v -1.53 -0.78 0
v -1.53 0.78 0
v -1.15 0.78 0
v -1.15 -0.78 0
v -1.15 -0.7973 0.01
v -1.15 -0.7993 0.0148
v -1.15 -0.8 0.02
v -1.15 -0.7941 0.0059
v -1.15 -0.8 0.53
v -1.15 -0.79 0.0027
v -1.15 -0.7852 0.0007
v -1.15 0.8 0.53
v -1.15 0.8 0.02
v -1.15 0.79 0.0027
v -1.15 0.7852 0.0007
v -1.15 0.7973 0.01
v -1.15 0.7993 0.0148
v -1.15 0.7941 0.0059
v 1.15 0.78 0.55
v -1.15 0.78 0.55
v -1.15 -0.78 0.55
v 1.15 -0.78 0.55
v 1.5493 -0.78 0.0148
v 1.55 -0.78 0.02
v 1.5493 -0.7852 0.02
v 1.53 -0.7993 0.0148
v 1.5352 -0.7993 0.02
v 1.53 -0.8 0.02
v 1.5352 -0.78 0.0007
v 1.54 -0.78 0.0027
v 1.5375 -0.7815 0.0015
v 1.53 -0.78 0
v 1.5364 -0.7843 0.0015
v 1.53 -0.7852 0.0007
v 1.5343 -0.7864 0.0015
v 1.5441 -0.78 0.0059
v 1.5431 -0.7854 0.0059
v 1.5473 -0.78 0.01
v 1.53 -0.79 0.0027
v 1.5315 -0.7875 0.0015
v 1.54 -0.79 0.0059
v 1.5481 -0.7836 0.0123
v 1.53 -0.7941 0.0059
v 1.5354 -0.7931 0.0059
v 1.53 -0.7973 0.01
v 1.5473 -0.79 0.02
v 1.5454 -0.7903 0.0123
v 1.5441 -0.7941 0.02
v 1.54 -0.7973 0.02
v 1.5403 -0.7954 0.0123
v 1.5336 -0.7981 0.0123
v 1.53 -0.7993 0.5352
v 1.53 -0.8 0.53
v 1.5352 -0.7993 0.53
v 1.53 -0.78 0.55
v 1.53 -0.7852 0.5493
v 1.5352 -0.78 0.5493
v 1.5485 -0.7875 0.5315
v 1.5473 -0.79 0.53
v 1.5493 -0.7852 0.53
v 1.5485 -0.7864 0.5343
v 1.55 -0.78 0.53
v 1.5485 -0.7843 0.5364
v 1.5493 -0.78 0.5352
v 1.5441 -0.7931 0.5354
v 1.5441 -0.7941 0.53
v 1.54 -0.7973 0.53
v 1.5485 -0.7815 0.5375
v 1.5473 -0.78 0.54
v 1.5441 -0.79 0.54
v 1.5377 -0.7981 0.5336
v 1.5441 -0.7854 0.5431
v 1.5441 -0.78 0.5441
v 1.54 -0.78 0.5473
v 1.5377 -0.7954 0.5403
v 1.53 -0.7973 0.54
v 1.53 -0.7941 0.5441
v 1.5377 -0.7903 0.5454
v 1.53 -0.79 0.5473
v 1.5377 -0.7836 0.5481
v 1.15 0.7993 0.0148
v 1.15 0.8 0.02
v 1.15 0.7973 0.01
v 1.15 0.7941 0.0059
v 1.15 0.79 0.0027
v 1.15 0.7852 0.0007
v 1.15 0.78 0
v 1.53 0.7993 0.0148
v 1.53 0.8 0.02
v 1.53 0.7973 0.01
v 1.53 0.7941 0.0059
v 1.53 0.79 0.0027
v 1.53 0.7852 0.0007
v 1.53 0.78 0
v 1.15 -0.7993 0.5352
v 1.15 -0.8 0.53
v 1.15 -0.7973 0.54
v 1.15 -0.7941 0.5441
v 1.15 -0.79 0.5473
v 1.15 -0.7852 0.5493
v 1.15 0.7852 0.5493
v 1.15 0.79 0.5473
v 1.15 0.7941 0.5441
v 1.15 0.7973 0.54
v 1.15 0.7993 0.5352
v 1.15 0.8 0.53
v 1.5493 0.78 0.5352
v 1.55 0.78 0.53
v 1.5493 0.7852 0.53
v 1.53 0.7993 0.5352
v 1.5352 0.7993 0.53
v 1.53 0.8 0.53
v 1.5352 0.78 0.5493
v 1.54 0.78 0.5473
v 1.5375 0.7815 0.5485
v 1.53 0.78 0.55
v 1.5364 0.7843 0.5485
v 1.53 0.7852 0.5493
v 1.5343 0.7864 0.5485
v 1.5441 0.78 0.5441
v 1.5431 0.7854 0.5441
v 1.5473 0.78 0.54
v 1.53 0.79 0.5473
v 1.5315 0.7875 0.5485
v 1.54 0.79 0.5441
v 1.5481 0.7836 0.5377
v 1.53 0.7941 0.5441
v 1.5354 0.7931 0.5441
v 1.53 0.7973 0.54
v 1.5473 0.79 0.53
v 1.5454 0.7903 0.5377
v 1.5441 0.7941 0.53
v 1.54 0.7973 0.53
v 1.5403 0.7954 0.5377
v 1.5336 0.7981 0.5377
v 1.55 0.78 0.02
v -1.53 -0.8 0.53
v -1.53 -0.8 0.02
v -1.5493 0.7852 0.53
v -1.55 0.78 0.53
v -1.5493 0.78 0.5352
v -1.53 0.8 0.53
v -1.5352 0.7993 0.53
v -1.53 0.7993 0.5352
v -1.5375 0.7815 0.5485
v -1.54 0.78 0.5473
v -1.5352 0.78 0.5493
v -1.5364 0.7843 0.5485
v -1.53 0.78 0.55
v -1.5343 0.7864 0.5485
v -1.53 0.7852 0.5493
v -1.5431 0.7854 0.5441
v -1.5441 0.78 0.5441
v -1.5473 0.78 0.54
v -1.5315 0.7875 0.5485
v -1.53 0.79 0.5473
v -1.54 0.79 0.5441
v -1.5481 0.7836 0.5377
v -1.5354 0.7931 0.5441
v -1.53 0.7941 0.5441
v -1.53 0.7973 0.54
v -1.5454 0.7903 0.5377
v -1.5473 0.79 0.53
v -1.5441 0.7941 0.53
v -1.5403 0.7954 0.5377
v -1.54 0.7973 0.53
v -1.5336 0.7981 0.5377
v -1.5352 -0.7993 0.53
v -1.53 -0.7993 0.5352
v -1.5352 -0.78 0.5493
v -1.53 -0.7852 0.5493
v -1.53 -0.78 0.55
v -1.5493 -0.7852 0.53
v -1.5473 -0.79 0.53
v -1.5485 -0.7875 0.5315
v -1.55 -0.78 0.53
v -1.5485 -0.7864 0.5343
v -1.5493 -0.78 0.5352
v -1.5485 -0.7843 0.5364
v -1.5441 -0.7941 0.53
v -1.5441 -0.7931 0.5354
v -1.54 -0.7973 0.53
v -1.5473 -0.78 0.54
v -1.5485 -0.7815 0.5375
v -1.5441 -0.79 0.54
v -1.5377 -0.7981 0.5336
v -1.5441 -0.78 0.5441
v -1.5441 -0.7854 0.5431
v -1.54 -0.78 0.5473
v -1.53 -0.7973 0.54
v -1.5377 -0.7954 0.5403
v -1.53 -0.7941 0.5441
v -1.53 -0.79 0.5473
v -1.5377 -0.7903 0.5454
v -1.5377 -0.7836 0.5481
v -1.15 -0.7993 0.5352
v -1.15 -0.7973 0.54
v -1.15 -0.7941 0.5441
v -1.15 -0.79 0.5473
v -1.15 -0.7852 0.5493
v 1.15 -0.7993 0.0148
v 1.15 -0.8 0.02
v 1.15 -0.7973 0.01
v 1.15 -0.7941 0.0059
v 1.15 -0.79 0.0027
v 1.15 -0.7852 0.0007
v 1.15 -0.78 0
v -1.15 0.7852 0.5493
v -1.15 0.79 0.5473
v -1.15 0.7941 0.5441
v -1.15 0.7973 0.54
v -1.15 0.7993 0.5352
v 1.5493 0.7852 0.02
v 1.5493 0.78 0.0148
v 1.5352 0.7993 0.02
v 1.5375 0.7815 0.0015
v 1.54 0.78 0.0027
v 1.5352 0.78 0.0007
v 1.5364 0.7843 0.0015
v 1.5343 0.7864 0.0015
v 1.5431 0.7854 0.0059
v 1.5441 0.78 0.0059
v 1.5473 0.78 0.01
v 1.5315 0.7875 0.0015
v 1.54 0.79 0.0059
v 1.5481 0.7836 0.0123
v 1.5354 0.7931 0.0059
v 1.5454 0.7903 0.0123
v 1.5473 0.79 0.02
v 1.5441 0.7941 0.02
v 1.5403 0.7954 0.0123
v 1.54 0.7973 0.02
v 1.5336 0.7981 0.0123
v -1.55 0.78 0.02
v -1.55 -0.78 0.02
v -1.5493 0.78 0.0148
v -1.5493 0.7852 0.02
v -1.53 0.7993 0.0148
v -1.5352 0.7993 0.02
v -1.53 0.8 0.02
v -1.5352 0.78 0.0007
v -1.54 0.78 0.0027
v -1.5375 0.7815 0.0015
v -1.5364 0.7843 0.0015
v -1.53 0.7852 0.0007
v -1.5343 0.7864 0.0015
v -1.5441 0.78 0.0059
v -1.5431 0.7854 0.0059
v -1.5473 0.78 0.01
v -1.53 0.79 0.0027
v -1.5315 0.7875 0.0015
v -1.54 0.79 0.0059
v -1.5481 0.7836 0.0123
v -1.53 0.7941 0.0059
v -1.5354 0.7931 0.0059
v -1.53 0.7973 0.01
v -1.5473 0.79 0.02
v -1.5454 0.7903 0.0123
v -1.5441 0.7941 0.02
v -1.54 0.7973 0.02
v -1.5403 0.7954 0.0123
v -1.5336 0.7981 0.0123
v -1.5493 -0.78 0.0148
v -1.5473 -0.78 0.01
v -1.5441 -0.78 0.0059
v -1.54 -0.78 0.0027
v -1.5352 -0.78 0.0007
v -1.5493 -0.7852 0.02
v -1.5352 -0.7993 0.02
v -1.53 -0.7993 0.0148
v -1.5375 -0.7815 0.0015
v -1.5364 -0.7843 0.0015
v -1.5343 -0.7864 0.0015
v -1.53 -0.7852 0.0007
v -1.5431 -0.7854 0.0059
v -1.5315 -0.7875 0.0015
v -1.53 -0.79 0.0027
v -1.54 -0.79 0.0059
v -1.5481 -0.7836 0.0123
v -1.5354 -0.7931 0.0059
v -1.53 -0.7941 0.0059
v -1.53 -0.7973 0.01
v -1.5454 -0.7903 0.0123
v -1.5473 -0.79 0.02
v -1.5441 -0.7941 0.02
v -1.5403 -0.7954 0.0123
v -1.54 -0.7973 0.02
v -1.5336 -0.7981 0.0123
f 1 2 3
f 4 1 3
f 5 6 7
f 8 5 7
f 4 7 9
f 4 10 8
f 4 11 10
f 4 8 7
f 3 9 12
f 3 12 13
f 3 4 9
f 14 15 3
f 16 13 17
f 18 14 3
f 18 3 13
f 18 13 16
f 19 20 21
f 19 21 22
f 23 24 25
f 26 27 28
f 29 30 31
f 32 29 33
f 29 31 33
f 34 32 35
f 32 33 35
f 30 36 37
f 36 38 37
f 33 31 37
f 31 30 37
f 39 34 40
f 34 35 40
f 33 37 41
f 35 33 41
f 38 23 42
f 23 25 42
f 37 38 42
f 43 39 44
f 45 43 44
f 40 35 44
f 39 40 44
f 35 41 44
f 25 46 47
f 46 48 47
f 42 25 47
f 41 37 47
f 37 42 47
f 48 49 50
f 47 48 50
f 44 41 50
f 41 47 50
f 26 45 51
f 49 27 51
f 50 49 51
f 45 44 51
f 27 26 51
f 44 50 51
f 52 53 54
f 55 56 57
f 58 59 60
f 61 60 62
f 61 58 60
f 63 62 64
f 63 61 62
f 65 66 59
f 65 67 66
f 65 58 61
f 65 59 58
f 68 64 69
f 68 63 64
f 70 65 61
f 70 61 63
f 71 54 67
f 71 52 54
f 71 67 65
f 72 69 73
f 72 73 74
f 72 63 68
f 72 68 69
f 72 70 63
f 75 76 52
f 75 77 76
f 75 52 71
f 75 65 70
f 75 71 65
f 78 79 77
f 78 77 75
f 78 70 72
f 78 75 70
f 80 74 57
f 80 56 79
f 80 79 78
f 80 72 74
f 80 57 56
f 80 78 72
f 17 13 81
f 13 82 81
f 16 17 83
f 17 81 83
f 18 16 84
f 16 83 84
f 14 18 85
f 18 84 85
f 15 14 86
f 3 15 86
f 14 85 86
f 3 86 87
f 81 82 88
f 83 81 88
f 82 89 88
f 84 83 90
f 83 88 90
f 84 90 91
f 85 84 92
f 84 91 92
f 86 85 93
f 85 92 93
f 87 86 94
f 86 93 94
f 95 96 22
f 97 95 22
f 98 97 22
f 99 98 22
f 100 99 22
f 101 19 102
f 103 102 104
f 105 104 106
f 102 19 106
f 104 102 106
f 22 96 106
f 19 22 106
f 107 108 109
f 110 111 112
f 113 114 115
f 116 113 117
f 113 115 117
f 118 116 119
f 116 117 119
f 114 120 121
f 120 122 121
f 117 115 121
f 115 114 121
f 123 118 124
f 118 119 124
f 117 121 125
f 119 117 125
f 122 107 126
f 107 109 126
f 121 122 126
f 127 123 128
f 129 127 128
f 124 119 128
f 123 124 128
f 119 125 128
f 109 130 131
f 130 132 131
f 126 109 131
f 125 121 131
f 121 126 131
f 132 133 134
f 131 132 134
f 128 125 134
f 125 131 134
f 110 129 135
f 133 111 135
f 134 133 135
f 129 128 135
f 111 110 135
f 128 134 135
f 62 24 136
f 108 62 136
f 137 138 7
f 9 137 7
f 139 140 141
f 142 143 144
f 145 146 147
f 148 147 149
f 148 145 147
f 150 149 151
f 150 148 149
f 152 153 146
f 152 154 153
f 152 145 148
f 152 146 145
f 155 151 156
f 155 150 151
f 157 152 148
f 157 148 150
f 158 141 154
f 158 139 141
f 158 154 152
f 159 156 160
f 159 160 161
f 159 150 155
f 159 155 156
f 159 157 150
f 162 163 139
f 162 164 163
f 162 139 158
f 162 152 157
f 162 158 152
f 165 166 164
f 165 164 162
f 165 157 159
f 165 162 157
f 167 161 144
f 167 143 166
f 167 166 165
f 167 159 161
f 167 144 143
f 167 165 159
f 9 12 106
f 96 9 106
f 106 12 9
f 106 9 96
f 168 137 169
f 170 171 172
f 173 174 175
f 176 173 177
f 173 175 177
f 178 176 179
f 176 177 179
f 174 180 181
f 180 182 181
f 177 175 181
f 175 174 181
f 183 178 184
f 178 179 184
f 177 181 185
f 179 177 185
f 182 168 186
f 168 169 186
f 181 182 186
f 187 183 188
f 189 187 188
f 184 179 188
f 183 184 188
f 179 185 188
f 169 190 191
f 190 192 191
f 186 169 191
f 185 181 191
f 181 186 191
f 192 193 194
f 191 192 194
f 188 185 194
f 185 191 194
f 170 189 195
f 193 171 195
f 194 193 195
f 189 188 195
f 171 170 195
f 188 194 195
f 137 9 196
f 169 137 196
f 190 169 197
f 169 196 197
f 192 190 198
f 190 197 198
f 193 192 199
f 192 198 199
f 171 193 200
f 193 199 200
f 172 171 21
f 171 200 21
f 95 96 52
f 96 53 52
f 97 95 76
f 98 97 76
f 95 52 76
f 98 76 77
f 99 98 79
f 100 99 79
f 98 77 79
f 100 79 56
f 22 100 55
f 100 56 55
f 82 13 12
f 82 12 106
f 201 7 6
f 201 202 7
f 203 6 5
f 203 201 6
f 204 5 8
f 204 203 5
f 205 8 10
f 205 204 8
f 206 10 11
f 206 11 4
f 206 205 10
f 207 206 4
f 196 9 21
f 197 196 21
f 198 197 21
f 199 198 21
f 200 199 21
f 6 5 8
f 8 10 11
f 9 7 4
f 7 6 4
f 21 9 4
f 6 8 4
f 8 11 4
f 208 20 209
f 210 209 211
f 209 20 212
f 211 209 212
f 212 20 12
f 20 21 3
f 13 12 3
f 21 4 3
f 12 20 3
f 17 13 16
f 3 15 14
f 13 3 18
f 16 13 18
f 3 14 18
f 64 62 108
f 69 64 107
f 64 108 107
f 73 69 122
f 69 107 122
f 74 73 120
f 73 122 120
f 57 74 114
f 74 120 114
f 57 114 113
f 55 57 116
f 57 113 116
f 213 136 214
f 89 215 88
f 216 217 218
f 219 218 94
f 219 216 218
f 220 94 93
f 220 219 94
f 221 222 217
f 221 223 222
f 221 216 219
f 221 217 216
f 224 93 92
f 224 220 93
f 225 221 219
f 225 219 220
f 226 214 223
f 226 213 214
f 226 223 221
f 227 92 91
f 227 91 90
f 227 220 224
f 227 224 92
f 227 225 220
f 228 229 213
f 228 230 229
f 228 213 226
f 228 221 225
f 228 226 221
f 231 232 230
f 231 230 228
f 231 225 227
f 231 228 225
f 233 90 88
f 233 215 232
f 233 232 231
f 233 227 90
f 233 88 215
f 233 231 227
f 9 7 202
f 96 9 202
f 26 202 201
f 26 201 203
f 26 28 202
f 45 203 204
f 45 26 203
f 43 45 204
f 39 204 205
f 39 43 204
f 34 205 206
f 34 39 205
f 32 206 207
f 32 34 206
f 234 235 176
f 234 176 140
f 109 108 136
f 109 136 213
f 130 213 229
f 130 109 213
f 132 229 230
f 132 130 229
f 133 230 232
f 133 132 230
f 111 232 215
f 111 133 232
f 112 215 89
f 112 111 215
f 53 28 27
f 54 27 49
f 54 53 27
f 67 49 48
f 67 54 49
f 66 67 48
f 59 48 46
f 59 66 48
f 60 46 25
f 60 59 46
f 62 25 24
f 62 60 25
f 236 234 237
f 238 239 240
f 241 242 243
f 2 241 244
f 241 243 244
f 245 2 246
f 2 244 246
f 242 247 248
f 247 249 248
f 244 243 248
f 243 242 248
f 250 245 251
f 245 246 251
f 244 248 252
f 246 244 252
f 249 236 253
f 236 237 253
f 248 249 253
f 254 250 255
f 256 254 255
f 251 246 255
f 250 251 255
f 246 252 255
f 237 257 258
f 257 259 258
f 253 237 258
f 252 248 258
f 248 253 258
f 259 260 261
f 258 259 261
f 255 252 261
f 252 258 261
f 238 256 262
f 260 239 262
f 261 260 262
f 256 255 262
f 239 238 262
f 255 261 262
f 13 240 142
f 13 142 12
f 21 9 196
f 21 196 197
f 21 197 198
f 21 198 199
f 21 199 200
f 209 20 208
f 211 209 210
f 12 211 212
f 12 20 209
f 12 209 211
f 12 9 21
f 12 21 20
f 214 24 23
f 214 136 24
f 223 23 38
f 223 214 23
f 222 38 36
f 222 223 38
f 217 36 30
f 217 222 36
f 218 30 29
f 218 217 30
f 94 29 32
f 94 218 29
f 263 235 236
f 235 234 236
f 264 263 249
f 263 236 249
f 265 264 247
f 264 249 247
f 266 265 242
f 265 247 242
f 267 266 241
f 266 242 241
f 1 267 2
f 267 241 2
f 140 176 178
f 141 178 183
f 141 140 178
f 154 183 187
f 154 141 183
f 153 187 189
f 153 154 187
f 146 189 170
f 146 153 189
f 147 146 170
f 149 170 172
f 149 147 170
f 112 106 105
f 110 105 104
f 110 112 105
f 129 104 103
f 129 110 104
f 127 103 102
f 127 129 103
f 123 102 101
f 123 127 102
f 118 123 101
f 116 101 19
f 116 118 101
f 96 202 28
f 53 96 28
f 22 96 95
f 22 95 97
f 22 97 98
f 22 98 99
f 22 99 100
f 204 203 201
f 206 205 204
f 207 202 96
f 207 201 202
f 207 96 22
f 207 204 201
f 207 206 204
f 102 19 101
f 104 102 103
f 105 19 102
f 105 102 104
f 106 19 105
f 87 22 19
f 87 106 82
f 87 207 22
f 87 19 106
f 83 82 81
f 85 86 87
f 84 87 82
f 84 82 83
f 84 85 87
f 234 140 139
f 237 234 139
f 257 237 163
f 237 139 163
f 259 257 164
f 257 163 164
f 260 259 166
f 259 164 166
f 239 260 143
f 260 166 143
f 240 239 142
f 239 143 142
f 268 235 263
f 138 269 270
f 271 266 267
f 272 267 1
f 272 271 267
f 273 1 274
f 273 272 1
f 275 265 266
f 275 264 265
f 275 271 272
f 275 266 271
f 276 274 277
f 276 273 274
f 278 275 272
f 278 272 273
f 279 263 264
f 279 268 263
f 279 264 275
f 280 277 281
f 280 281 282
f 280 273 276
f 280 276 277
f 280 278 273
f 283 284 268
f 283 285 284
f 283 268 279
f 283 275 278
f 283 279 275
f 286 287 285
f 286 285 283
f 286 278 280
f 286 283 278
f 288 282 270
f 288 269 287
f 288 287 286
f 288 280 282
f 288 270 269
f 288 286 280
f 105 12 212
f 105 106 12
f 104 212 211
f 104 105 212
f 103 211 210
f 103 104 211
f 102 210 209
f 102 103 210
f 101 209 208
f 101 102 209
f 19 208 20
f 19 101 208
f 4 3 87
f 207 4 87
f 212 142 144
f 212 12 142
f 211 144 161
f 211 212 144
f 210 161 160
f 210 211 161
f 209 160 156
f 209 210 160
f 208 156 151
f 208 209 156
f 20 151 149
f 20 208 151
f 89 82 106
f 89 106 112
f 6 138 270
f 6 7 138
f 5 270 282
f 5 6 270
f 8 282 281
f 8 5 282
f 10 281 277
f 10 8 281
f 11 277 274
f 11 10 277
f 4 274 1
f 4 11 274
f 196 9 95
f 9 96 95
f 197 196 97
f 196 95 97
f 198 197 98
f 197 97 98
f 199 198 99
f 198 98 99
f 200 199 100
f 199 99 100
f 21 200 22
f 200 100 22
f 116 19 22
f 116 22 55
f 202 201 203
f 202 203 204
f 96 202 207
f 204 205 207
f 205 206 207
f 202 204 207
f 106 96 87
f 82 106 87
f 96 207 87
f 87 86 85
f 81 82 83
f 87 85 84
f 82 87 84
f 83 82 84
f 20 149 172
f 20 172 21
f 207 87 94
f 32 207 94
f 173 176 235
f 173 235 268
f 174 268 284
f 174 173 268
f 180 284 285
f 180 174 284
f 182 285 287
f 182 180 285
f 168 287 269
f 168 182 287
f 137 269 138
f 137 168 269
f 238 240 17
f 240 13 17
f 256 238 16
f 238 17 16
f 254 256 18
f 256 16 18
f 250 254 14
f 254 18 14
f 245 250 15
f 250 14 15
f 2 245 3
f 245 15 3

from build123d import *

# Parameters (mm, degrees)
F2_W     = 2.3
F2_H     = 1.6
F3_DEPTH = 0.53
F2_W_2   = 0.4
F4_DEPTH = 0.55
F5_DEPTH = 0.55
F6_DEPTH = 0.02
F7_R     = 0.01999
F7_2_R   = 0.01999
F7_3_R   = 0.01999
F7_4_R   = 0.01999


# Not quite as in the source:
# - a fillet or chamfer is up to 0.001 mm smaller than in the source, because OpenCascade refuses the exact size


with BuildPart() as f3:
    # F2 (on Top) → F3 (new body)
    with BuildSketch(Plane.XY):
        Rectangle(F2_W, F2_H)
    extrude(amount=F3_DEPTH)


with BuildPart() as f4:
    # F2 (on Top) → F4 (new body)
    with BuildSketch(Plane.XY):
        with Locations((-1.35, 0)):
            Rectangle(F2_W_2, F2_H)
    extrude(amount=F4_DEPTH)

    # F7 (radius 0.02 in the source; OpenCascade refuses exactly that, so slightly less here)
    f7_edges = [f4.edges().sort_by_distance(p)[0] for p in [
        (-1.35, -0.8, 0.55),
        (-1.55, 0.8, 0.275),
        (-1.55, -0.8, 0.275),
        (-1.55, 0, 0),
        (-1.55, 0, 0.55),
        (-1.35, 0.8, 0.55),
        (-1.35, 0.8, 0),
        (-1.35, -0.8, 0),
    ]]
    fillet(f7_edges, radius=F7_R)


with BuildPart() as f5:
    # F2 (on Top) → F5 (new body)
    with BuildSketch(Plane.XY):
        with Locations((1.35, 0)):
            Rectangle(F2_W_2, F2_H)
    extrude(amount=F5_DEPTH)

    # F7#2 (radius 0.02 in the source; OpenCascade refuses exactly that, so slightly less here)
    f7_2_edges = [f5.edges().sort_by_distance(p)[0] for p in [
        (1.35, -0.8, 0.55),
        (1.55, -0.8, 0.275),
        (1.55, 0.8, 0.275),
        (1.55, 0, 0),
        (1.55, 0, 0.55),
        (1.35, 0.8, 0.55),
        (1.35, 0.8, 0),
        (1.35, -0.8, 0),
    ]]
    fillet(f7_2_edges, radius=F7_2_R)


with BuildPart() as f6:
    # F6 (new): a face of the model
    f6_faces = [f3.part.faces().sort_by_distance(p)[0] for p in [
        (0, 0, 0.53),
    ]]
    extrude(f6_faces, amount=F6_DEPTH)

    # F7#4 (radius 0.02 in the source; OpenCascade refuses exactly that, so slightly less here)
    f7_4_edges = [f6.edges().sort_by_distance(p)[0] for p in [
        (0, -0.8, 0.55),
        (0, 0.8, 0.55),
    ]]
    fillet(f7_4_edges, radius=F7_4_R)


with BuildPart() as f3_1:
    add(f3.part)

    # F7#3 (radius 0.02 in the source; OpenCascade refuses exactly that, so slightly less here)
    f7_3_edges = [f3_1.edges().sort_by_distance(p)[0] for p in [
        (0, 0.8, 0),
        (0, -0.8, 0),
    ]]
    fillet(f7_3_edges, radius=F7_3_R)


solid = Compound([f4.part, f5.part, f6.part, f3_1.part])
